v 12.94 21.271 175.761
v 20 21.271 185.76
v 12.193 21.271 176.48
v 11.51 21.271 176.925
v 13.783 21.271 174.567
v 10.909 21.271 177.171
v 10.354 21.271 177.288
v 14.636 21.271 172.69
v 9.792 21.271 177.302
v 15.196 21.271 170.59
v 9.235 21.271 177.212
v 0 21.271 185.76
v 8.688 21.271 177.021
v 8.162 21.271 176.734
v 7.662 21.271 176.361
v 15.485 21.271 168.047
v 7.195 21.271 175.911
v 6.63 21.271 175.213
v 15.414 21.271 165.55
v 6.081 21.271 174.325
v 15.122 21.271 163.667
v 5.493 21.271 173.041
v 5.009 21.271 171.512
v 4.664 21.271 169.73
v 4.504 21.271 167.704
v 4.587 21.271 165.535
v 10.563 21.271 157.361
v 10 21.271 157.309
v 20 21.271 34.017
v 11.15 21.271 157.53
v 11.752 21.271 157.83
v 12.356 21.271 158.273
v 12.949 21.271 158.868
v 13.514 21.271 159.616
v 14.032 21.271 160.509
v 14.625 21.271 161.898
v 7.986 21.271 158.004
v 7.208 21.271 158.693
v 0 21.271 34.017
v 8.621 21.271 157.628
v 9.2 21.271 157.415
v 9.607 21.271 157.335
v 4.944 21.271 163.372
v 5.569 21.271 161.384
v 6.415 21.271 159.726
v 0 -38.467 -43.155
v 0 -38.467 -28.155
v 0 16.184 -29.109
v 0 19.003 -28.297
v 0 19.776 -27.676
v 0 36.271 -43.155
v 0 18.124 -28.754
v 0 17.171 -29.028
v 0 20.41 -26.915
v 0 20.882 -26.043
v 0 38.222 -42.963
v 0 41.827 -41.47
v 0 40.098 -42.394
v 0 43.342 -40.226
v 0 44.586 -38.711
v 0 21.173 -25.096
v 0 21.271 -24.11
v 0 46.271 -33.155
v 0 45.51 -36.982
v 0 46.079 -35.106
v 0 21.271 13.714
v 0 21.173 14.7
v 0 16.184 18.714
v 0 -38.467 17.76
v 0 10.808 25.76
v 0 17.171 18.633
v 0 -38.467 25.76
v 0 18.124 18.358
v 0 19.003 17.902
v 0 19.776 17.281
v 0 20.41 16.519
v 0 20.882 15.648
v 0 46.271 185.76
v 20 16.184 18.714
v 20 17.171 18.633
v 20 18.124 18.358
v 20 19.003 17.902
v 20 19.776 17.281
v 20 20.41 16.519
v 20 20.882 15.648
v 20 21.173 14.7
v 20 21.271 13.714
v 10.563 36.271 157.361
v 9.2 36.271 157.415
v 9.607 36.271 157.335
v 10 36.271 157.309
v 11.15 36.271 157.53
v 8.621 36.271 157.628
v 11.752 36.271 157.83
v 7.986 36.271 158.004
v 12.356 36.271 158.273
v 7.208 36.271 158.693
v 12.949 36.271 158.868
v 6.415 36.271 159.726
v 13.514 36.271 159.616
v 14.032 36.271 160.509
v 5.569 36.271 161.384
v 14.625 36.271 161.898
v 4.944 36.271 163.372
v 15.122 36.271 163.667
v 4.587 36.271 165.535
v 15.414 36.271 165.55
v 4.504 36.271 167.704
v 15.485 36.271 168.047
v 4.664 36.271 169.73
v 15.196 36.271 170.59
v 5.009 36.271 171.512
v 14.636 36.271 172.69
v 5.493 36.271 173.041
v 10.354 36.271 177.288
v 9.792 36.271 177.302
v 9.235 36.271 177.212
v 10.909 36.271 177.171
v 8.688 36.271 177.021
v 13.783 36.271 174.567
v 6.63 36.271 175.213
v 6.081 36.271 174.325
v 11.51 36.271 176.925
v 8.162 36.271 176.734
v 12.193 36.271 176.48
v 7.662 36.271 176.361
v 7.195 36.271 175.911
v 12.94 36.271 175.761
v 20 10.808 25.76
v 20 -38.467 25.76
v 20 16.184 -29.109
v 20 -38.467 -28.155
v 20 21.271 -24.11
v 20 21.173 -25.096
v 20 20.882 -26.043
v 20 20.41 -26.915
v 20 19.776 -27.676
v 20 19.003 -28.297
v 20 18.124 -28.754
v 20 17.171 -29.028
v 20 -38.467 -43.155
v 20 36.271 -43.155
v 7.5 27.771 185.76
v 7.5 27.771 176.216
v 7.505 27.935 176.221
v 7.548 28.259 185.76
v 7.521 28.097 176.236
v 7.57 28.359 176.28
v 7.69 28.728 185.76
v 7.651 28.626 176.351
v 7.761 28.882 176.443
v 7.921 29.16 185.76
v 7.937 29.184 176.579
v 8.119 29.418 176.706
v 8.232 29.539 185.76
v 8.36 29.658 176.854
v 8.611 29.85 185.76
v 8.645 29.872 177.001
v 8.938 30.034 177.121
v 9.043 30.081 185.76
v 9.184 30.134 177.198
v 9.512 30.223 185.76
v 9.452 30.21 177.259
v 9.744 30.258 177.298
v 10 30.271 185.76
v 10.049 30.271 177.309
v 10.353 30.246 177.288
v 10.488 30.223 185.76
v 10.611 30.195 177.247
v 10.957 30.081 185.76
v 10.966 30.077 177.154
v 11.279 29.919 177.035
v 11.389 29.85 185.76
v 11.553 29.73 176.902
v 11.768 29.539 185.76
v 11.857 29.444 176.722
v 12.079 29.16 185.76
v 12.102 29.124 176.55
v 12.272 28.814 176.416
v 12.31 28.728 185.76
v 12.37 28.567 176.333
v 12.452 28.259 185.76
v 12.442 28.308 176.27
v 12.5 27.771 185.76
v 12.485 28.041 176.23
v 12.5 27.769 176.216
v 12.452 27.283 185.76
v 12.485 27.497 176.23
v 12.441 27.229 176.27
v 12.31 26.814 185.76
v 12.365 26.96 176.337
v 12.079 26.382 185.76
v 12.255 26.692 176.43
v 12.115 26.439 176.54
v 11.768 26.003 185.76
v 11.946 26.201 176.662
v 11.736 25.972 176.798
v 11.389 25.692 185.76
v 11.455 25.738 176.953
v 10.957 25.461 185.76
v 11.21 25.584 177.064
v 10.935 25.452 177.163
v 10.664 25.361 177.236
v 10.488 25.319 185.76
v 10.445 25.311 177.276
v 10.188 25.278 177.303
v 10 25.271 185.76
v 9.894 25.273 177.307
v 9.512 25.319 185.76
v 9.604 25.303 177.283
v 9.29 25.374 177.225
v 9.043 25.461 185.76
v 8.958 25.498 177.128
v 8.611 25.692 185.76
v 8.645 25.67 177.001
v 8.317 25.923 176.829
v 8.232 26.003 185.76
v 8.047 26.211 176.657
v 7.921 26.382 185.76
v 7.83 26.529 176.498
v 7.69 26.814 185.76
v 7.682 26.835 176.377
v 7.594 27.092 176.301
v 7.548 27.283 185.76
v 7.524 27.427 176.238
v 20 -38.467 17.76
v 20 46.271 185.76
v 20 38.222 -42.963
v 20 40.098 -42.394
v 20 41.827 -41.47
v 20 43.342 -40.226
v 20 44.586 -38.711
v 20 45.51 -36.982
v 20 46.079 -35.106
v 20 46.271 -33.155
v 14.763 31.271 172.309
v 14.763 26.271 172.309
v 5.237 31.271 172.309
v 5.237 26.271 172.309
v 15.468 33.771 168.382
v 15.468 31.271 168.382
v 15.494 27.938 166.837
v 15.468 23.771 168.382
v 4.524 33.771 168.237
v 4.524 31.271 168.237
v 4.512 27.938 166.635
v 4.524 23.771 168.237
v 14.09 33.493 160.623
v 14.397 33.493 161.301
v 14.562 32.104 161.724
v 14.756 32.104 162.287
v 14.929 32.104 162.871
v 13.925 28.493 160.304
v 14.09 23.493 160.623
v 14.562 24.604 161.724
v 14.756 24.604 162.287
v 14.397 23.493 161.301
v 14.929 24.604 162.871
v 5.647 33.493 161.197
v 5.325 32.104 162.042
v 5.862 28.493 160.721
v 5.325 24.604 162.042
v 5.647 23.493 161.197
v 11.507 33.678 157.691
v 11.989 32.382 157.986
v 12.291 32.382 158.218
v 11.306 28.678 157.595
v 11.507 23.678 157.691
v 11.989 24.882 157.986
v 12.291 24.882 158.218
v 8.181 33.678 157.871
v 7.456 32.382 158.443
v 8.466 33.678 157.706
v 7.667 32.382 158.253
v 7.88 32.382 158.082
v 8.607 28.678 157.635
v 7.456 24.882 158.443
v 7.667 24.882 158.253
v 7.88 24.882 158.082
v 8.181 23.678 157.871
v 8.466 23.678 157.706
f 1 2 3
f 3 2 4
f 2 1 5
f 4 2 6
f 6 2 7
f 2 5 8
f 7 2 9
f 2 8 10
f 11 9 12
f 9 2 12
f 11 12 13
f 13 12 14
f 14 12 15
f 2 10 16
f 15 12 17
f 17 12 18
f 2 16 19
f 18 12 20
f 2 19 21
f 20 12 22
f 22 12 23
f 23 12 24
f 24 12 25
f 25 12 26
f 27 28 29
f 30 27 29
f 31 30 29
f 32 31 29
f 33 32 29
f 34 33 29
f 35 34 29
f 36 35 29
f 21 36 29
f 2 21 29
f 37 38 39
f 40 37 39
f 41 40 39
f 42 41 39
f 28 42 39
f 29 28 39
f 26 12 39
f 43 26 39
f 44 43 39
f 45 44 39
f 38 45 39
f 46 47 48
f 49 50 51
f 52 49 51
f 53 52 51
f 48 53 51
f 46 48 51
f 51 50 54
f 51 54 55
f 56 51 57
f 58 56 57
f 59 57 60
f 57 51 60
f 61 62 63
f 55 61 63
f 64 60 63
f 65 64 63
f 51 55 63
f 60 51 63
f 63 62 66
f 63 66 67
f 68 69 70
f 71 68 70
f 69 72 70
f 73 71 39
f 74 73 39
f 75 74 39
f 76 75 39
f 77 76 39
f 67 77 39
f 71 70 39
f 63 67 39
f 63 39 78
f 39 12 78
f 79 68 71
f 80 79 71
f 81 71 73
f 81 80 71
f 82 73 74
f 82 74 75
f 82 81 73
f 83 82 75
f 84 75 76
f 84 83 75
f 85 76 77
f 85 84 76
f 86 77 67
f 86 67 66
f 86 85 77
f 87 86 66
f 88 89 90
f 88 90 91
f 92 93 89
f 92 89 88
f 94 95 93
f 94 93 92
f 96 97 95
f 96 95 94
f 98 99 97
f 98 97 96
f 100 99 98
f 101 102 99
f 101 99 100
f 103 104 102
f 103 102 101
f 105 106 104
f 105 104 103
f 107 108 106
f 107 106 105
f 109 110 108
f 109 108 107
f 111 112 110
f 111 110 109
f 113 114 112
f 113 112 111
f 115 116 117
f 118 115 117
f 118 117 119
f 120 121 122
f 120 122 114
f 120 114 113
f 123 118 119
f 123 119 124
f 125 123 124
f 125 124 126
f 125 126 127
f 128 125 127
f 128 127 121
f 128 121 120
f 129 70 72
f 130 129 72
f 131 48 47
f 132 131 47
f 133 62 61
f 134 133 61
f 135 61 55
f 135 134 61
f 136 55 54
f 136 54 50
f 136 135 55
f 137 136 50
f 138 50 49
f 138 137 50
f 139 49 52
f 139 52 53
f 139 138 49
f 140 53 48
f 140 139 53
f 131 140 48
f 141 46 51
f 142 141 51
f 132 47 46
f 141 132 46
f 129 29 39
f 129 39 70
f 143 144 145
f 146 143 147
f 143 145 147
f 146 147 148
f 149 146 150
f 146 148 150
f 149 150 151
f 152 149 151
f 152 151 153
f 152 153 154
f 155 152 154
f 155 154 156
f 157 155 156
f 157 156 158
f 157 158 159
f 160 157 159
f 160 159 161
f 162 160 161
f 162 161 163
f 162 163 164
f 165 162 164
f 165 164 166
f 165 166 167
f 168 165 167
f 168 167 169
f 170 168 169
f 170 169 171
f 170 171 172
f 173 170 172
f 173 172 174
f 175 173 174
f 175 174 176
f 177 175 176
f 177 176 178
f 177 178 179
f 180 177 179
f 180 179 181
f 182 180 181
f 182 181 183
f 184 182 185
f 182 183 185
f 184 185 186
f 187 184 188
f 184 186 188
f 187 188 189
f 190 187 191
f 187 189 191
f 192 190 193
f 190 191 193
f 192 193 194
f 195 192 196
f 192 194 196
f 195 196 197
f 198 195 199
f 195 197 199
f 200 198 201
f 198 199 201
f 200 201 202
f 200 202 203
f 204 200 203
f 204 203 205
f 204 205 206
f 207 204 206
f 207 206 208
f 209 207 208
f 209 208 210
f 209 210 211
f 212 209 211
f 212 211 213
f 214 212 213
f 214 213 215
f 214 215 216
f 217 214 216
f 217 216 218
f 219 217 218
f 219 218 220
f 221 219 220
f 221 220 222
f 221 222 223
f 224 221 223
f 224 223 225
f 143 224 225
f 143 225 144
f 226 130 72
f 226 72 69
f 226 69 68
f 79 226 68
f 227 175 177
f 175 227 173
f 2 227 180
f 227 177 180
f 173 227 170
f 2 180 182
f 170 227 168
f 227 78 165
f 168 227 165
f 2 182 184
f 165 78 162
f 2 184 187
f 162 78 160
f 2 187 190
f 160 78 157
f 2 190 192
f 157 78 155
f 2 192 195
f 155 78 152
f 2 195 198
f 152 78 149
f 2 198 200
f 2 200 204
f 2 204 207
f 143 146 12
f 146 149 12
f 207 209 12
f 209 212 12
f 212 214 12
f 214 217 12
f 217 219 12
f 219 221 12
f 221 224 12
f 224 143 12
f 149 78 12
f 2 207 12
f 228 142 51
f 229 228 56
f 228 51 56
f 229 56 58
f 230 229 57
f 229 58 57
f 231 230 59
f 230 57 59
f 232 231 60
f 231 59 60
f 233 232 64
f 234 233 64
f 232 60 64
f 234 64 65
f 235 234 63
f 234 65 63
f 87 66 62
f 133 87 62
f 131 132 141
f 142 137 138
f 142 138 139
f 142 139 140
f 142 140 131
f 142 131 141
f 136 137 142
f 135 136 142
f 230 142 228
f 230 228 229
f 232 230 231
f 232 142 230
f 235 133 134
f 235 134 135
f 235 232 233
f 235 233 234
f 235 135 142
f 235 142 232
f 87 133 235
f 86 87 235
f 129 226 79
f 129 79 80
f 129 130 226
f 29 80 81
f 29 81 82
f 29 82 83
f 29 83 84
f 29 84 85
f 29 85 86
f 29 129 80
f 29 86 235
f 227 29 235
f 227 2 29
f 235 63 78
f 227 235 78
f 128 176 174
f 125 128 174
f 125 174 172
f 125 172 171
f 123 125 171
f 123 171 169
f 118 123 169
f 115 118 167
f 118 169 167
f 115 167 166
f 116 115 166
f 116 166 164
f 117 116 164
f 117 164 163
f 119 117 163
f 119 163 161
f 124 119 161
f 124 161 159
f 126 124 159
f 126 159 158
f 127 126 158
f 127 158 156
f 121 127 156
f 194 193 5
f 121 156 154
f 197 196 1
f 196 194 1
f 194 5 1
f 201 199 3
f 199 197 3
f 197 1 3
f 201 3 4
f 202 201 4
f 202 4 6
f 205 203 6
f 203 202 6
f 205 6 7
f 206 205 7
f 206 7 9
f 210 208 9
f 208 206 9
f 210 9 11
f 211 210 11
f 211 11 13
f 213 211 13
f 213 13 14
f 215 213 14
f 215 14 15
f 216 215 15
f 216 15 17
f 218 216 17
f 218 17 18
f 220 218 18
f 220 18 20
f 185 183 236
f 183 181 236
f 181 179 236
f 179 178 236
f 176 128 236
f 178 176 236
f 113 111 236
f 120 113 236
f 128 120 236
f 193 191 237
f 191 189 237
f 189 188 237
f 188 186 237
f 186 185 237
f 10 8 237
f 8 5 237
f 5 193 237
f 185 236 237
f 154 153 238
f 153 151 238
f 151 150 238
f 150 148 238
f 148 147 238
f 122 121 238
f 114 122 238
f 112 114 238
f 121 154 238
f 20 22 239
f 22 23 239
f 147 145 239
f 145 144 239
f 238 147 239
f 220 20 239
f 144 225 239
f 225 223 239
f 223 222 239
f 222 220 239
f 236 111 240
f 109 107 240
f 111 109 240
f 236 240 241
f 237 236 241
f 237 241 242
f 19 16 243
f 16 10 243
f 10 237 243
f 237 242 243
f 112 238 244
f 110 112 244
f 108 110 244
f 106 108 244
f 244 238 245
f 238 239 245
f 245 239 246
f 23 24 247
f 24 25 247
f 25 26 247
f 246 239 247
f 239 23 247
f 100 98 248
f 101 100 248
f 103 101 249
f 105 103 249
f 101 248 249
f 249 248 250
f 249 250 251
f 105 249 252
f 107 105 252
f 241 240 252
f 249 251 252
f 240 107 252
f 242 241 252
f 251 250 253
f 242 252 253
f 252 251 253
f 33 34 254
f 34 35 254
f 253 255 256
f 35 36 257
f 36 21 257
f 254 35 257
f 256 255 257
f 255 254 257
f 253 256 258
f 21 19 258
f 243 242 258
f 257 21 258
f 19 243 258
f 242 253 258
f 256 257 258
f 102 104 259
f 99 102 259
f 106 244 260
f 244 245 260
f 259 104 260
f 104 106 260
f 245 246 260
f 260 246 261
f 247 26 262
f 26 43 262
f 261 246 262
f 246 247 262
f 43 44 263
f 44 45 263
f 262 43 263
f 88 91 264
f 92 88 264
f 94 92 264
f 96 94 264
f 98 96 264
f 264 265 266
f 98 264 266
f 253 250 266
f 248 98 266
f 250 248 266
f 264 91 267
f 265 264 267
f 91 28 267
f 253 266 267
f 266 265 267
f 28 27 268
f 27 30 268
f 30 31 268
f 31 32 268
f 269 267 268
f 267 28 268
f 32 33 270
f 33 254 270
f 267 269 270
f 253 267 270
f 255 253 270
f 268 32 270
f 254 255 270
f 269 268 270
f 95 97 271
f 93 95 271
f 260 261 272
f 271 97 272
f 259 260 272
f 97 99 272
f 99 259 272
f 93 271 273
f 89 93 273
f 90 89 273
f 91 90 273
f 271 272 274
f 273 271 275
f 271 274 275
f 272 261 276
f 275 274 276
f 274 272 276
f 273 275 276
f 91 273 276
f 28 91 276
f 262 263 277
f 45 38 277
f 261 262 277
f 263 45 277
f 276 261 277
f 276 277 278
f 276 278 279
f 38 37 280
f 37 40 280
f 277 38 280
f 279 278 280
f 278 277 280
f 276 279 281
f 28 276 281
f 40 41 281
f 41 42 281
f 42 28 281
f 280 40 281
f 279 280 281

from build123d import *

# Parameters (mm, degrees)
F1_DEPTH = 20
F2_R     = 5
F4_DEPTH = 15
F6_D     = 5
F6_DEPTH = 12


with BuildPart() as f1:
    # F0 (on Right) → F1 (new body)
    with BuildSketch(Plane.YZ):
        with BuildLine():
            Line((-38.467346, 25.759617), (-38.467346, 17.759617))
            Line((-38.467346, 17.759617), (21.27099, 18.802353))
            Line((21.27099, 18.802353), (21.27099, -29.197647))
            Line((21.27099, -29.197647), (-38.467346, -28.15491))
            Line((-38.467346, -28.15491), (-38.467346, -43.15491))
            Line((-38.467346, -43.15491), (36.27099, -43.15491))
            ThreePointArc((36.27099, -43.15491), (43.342058, -40.225978), (46.27099, -33.15491))
            Line((46.27099, -33.15491), (46.27099, 185.759617))
            Line((46.27099, 185.759617), (21.27099, 185.759617))
            Line((21.27099, 185.759617), (21.27099, 34.016647))
            Line((21.27099, 34.016647), (10.807667, 25.759617))
            Line((10.807667, 25.759617), (-38.467346, 25.759617))
        make_face()
    extrude(amount=F1_DEPTH)

    # F2
    f2_edges = [f1.edges().sort_by_distance(p)[0] for p in [
        (10, 21.27099, 18.802353),
        (10, 21.27099, -29.197647),
    ]]
    fillet(f2_edges, radius=F2_R)

    # F3 (on face) → F4 (cut)
    with BuildSketch(Plane.XZ.offset(-21.27099)):
        with BuildLine():
            add(Edge.make_bspline(
                [(10, 157.308986), (19.526279, 157.308986), (14.76314, 172.308986), (10, 187.308986), (5.23686, 172.308986), (0.473721, 157.308986), (10, 157.308986)],
                knots=[0, 0, 0, 2.094395, 2.094395, 4.18879, 4.18879, 6.283185, 6.283185, 6.283185], degree=2, weights=[1, 0.5, 1, 0.5, 1, 0.5, 1]))
        make_face()
    extrude(amount=-F4_DEPTH, mode=Mode.SUBTRACT)

    # F6
    with Locations(Plane.XY.offset(185.759617)):
        with Locations((10, 27.77099)):
            Hole(F6_D / 2, depth=F6_DEPTH)


solid = f1.part
